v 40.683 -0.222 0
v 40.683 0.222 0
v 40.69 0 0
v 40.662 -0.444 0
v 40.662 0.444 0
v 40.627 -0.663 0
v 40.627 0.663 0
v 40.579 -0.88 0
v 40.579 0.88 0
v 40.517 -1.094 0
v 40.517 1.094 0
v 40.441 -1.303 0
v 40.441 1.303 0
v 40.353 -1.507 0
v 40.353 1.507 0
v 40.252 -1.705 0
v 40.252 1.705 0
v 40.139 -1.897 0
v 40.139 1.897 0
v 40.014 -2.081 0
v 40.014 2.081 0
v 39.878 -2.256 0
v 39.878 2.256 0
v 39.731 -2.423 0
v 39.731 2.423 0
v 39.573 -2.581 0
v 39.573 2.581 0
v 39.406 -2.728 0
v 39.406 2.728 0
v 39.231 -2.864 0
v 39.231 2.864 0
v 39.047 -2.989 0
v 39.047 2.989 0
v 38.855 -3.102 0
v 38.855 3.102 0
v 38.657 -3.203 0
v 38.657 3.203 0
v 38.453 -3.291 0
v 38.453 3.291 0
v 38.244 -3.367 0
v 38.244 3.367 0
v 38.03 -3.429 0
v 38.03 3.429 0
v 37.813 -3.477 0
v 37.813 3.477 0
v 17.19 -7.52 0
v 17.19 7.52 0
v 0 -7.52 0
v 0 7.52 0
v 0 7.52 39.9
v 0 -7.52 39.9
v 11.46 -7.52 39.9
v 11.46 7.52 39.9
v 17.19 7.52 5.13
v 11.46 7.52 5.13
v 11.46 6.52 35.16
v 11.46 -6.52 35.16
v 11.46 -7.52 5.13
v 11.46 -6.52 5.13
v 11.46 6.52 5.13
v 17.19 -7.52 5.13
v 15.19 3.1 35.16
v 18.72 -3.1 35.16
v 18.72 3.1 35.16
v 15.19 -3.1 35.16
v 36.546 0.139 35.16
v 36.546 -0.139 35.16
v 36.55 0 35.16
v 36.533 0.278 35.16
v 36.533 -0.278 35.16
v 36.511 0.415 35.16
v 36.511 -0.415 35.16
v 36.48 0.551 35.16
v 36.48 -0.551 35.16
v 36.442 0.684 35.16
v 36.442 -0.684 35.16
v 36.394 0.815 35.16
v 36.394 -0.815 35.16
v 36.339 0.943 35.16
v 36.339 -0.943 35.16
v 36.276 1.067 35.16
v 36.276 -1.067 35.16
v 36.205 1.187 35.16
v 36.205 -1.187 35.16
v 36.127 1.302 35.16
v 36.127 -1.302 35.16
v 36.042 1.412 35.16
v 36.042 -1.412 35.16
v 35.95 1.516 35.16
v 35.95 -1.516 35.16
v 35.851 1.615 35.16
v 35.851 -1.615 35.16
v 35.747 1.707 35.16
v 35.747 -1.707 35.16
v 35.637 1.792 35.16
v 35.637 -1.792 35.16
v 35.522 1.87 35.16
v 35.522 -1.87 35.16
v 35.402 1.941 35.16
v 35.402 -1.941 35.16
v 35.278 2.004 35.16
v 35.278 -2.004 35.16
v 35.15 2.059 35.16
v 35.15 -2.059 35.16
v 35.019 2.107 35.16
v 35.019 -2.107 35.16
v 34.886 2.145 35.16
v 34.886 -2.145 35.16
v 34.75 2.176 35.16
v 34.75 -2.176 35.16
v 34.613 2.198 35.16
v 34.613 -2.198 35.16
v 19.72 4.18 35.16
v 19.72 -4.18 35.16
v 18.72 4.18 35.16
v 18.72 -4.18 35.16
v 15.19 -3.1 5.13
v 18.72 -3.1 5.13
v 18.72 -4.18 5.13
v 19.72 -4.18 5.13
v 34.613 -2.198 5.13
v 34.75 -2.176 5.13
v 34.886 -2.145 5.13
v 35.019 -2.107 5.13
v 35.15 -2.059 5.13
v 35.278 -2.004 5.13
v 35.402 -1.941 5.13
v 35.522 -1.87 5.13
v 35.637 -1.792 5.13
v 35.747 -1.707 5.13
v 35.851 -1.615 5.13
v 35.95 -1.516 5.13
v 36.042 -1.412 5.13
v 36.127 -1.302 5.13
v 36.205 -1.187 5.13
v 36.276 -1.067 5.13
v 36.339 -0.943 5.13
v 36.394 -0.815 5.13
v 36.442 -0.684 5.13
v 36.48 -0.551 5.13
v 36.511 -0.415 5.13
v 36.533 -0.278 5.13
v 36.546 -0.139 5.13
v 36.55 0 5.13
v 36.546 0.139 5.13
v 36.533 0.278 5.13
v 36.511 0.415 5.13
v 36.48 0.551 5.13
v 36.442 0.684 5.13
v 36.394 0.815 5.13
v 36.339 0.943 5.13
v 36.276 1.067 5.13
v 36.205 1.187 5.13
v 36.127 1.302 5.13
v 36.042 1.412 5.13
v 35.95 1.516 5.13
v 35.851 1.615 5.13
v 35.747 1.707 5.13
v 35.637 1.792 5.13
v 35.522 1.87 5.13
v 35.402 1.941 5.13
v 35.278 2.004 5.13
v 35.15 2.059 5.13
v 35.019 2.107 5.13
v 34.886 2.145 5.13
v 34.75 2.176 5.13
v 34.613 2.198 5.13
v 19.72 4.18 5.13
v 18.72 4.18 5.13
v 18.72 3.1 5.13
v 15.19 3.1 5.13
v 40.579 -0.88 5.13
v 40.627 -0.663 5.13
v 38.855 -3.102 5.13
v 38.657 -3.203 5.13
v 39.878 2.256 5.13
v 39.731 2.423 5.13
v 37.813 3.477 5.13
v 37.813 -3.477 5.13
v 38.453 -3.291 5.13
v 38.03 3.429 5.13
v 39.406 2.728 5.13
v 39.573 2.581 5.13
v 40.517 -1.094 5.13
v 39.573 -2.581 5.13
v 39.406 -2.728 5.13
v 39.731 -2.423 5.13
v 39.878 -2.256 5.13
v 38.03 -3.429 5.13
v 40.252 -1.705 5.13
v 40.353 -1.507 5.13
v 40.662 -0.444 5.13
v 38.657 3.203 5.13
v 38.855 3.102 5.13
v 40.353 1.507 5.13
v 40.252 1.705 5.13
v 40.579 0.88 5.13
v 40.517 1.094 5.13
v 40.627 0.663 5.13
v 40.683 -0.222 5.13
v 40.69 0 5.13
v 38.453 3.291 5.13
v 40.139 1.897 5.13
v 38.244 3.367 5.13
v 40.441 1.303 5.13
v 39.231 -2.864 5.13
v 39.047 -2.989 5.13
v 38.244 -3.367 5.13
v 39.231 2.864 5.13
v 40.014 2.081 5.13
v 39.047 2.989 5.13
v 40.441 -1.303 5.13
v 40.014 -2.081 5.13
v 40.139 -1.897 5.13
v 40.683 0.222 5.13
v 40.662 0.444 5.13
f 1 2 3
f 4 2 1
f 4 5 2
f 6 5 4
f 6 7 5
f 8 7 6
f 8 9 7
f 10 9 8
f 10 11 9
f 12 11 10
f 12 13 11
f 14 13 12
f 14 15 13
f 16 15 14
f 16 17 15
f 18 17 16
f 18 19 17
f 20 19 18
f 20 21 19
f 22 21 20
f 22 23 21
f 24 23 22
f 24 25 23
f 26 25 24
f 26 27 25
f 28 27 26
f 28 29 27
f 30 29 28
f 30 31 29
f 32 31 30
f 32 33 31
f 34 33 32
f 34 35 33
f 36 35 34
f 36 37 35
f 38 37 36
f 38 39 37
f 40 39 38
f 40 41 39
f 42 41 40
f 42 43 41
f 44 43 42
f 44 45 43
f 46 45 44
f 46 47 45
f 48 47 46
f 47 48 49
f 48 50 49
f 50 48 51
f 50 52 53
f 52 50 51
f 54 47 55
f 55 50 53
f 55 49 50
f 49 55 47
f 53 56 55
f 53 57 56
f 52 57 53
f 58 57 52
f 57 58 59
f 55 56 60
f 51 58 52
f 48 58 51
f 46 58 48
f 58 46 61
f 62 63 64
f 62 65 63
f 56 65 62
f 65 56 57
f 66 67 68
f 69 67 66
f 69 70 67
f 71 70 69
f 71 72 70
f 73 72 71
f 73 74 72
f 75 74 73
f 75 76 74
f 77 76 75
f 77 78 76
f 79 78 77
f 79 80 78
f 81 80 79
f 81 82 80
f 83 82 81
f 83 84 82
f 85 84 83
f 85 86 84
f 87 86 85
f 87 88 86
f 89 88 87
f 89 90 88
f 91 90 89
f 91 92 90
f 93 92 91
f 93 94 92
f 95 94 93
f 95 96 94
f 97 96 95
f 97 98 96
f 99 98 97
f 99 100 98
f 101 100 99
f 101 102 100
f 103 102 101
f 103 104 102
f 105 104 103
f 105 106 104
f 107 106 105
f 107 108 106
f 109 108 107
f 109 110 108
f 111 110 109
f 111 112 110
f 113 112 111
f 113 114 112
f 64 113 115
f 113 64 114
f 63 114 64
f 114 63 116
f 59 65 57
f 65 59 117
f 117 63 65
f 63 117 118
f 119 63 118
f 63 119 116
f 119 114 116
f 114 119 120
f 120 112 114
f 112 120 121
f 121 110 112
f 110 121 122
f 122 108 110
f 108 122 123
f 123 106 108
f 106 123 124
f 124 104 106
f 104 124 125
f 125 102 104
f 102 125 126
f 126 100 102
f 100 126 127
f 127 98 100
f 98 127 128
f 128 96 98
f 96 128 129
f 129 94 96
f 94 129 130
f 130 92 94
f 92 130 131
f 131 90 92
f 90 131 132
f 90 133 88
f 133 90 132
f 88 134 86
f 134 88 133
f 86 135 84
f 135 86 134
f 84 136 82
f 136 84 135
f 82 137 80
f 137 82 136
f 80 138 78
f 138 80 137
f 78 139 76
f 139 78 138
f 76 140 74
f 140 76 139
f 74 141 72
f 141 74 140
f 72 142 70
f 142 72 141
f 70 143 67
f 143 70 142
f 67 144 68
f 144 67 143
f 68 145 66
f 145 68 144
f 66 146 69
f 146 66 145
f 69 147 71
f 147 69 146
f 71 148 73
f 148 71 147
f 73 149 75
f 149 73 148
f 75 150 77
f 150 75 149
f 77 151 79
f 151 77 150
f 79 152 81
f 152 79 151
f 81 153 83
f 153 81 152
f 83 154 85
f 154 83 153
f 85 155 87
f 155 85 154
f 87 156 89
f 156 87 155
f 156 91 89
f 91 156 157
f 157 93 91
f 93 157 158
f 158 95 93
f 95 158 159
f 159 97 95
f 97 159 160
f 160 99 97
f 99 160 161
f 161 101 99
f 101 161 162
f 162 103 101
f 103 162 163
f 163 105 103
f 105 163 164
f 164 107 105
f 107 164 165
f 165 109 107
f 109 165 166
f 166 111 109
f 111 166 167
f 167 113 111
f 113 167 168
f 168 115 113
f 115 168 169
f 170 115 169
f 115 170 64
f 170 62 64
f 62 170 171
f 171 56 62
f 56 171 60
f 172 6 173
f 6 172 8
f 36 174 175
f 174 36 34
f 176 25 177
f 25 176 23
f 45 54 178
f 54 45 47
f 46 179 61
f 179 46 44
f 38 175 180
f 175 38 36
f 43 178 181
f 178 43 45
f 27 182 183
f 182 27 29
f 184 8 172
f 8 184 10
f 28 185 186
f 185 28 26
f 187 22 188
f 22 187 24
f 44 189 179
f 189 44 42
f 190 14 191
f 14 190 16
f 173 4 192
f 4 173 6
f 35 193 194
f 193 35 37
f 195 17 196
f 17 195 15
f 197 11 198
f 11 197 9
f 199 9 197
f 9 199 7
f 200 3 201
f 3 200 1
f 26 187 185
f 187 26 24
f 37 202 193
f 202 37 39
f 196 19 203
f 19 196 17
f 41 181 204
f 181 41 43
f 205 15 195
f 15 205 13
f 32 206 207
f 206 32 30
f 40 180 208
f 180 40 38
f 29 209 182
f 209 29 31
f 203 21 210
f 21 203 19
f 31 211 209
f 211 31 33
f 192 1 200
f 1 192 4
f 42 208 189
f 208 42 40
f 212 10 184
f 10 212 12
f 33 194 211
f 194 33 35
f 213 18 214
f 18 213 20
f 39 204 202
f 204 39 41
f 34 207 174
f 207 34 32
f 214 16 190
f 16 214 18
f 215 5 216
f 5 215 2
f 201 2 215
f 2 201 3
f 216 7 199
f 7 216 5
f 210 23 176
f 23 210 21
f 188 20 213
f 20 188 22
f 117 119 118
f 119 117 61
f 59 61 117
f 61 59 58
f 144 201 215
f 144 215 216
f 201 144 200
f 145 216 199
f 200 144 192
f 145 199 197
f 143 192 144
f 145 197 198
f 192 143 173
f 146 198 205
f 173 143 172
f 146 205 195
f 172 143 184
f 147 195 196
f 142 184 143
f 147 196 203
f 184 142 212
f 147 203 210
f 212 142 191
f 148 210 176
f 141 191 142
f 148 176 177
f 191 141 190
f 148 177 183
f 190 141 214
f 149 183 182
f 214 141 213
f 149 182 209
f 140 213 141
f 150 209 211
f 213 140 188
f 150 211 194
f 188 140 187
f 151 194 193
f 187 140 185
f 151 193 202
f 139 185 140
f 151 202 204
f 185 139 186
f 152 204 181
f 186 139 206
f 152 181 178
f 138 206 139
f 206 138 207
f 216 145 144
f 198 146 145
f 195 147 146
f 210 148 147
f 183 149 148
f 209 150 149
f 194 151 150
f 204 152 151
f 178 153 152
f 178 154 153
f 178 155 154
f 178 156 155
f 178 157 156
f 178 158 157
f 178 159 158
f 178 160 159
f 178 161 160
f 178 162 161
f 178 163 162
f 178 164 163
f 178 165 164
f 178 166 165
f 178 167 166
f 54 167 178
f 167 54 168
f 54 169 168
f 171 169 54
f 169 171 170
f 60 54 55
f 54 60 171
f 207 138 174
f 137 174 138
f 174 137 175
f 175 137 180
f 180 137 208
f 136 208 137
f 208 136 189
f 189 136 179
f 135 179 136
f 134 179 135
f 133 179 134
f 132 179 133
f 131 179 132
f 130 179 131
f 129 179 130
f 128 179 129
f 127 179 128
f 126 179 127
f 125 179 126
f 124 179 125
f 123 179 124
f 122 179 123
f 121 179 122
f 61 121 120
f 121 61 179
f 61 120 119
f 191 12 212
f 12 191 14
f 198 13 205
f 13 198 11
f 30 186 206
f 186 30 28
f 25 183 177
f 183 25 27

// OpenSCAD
/* ==========================================================
 * 3d_ikea_lunna_feet_cap.scad
 * OpenSCAD file for IKEA Lunna harmchair feet caps
 *
 * Authors: Xavier Alexandre and Marc Friederich
 * Date:   2014-08-02 19:30:14
 *
 * Licensed under MIT
 =========================================================== */

// Dimensions en mm

hauteur_bordure=40.69; // Hauteur du triangle fin
rayon_haut_bordure=7.08/2; // Rayon de courbure du haut du triangle fin

hauteur_base=11.46; // Hauteur de la base
largeur_base=15.04; // Largeur de la base

// Encoche
creux=6.2; // Epaisseur de l'encoche au point le plus étroit
largeur_base_pointe=8.36; //Epaisseur de l'encoche à la base

hauteur_encoche=36.55;
bordure_base_encoche=1; //Bordure à la base de l'encoche
position_hauteur_base_pointe=18.72;
base_creux_encoche=15.19;
hauteur_creux=position_hauteur_base_pointe - base_creux_encoche;
hauteur_base_pointe=1;
rayon_haut_encoche=4.43/2; // Rayon de courbure du haut de l'encoche

profondeur_bordure=5.13;
profondeur_encoche=35.16;
profondeur_base=39.9;


$fn=100; //resolution

module base(){
	translate([hauteur_base/2,0,0]){
		square([hauteur_base,largeur_base], center=true);
	}
}

module encoche(){

	module milieu(){
		polygon(points=[[hauteur_base,largeur_base/2-bordure_base_encoche],[base_creux_encoche,creux/2],[base_creux_encoche,-creux/2],[hauteur_base,-(largeur_base/2-bordure_base_encoche)]], paths=[[0,1,2,3]]);
		translate([hauteur_creux/2+base_creux_encoche,0]){square([hauteur_creux,creux], center=true);};
		hull(){
			translate([position_hauteur_base_pointe+hauteur_base_pointe/2,0]){square([hauteur_base_pointe,largeur_base_pointe], center=true);};
			translate([hauteur_encoche-rayon_haut_encoche,0]){circle(rayon_haut_encoche, center=true);};
		}
	}
	module haut(){

	}
	base();
	milieu();
	haut();
}

module bordure(){
	hull(){
		translate([hauteur_base/2,0]){base();};
		translate([hauteur_bordure-rayon_haut_bordure,0]){circle(rayon_haut_bordure, center=true);};
	}
}



color([255, 0, 0, 1]){
	linear_extrude(profondeur_base){
		base();
	}
}

color([0, 255, 0, 1]){
	linear_extrude(profondeur_encoche){
		encoche();
	}
}

color([255, 255, 0, 1]){
	linear_extrude(profondeur_bordure){
		bordure();
	}
}
